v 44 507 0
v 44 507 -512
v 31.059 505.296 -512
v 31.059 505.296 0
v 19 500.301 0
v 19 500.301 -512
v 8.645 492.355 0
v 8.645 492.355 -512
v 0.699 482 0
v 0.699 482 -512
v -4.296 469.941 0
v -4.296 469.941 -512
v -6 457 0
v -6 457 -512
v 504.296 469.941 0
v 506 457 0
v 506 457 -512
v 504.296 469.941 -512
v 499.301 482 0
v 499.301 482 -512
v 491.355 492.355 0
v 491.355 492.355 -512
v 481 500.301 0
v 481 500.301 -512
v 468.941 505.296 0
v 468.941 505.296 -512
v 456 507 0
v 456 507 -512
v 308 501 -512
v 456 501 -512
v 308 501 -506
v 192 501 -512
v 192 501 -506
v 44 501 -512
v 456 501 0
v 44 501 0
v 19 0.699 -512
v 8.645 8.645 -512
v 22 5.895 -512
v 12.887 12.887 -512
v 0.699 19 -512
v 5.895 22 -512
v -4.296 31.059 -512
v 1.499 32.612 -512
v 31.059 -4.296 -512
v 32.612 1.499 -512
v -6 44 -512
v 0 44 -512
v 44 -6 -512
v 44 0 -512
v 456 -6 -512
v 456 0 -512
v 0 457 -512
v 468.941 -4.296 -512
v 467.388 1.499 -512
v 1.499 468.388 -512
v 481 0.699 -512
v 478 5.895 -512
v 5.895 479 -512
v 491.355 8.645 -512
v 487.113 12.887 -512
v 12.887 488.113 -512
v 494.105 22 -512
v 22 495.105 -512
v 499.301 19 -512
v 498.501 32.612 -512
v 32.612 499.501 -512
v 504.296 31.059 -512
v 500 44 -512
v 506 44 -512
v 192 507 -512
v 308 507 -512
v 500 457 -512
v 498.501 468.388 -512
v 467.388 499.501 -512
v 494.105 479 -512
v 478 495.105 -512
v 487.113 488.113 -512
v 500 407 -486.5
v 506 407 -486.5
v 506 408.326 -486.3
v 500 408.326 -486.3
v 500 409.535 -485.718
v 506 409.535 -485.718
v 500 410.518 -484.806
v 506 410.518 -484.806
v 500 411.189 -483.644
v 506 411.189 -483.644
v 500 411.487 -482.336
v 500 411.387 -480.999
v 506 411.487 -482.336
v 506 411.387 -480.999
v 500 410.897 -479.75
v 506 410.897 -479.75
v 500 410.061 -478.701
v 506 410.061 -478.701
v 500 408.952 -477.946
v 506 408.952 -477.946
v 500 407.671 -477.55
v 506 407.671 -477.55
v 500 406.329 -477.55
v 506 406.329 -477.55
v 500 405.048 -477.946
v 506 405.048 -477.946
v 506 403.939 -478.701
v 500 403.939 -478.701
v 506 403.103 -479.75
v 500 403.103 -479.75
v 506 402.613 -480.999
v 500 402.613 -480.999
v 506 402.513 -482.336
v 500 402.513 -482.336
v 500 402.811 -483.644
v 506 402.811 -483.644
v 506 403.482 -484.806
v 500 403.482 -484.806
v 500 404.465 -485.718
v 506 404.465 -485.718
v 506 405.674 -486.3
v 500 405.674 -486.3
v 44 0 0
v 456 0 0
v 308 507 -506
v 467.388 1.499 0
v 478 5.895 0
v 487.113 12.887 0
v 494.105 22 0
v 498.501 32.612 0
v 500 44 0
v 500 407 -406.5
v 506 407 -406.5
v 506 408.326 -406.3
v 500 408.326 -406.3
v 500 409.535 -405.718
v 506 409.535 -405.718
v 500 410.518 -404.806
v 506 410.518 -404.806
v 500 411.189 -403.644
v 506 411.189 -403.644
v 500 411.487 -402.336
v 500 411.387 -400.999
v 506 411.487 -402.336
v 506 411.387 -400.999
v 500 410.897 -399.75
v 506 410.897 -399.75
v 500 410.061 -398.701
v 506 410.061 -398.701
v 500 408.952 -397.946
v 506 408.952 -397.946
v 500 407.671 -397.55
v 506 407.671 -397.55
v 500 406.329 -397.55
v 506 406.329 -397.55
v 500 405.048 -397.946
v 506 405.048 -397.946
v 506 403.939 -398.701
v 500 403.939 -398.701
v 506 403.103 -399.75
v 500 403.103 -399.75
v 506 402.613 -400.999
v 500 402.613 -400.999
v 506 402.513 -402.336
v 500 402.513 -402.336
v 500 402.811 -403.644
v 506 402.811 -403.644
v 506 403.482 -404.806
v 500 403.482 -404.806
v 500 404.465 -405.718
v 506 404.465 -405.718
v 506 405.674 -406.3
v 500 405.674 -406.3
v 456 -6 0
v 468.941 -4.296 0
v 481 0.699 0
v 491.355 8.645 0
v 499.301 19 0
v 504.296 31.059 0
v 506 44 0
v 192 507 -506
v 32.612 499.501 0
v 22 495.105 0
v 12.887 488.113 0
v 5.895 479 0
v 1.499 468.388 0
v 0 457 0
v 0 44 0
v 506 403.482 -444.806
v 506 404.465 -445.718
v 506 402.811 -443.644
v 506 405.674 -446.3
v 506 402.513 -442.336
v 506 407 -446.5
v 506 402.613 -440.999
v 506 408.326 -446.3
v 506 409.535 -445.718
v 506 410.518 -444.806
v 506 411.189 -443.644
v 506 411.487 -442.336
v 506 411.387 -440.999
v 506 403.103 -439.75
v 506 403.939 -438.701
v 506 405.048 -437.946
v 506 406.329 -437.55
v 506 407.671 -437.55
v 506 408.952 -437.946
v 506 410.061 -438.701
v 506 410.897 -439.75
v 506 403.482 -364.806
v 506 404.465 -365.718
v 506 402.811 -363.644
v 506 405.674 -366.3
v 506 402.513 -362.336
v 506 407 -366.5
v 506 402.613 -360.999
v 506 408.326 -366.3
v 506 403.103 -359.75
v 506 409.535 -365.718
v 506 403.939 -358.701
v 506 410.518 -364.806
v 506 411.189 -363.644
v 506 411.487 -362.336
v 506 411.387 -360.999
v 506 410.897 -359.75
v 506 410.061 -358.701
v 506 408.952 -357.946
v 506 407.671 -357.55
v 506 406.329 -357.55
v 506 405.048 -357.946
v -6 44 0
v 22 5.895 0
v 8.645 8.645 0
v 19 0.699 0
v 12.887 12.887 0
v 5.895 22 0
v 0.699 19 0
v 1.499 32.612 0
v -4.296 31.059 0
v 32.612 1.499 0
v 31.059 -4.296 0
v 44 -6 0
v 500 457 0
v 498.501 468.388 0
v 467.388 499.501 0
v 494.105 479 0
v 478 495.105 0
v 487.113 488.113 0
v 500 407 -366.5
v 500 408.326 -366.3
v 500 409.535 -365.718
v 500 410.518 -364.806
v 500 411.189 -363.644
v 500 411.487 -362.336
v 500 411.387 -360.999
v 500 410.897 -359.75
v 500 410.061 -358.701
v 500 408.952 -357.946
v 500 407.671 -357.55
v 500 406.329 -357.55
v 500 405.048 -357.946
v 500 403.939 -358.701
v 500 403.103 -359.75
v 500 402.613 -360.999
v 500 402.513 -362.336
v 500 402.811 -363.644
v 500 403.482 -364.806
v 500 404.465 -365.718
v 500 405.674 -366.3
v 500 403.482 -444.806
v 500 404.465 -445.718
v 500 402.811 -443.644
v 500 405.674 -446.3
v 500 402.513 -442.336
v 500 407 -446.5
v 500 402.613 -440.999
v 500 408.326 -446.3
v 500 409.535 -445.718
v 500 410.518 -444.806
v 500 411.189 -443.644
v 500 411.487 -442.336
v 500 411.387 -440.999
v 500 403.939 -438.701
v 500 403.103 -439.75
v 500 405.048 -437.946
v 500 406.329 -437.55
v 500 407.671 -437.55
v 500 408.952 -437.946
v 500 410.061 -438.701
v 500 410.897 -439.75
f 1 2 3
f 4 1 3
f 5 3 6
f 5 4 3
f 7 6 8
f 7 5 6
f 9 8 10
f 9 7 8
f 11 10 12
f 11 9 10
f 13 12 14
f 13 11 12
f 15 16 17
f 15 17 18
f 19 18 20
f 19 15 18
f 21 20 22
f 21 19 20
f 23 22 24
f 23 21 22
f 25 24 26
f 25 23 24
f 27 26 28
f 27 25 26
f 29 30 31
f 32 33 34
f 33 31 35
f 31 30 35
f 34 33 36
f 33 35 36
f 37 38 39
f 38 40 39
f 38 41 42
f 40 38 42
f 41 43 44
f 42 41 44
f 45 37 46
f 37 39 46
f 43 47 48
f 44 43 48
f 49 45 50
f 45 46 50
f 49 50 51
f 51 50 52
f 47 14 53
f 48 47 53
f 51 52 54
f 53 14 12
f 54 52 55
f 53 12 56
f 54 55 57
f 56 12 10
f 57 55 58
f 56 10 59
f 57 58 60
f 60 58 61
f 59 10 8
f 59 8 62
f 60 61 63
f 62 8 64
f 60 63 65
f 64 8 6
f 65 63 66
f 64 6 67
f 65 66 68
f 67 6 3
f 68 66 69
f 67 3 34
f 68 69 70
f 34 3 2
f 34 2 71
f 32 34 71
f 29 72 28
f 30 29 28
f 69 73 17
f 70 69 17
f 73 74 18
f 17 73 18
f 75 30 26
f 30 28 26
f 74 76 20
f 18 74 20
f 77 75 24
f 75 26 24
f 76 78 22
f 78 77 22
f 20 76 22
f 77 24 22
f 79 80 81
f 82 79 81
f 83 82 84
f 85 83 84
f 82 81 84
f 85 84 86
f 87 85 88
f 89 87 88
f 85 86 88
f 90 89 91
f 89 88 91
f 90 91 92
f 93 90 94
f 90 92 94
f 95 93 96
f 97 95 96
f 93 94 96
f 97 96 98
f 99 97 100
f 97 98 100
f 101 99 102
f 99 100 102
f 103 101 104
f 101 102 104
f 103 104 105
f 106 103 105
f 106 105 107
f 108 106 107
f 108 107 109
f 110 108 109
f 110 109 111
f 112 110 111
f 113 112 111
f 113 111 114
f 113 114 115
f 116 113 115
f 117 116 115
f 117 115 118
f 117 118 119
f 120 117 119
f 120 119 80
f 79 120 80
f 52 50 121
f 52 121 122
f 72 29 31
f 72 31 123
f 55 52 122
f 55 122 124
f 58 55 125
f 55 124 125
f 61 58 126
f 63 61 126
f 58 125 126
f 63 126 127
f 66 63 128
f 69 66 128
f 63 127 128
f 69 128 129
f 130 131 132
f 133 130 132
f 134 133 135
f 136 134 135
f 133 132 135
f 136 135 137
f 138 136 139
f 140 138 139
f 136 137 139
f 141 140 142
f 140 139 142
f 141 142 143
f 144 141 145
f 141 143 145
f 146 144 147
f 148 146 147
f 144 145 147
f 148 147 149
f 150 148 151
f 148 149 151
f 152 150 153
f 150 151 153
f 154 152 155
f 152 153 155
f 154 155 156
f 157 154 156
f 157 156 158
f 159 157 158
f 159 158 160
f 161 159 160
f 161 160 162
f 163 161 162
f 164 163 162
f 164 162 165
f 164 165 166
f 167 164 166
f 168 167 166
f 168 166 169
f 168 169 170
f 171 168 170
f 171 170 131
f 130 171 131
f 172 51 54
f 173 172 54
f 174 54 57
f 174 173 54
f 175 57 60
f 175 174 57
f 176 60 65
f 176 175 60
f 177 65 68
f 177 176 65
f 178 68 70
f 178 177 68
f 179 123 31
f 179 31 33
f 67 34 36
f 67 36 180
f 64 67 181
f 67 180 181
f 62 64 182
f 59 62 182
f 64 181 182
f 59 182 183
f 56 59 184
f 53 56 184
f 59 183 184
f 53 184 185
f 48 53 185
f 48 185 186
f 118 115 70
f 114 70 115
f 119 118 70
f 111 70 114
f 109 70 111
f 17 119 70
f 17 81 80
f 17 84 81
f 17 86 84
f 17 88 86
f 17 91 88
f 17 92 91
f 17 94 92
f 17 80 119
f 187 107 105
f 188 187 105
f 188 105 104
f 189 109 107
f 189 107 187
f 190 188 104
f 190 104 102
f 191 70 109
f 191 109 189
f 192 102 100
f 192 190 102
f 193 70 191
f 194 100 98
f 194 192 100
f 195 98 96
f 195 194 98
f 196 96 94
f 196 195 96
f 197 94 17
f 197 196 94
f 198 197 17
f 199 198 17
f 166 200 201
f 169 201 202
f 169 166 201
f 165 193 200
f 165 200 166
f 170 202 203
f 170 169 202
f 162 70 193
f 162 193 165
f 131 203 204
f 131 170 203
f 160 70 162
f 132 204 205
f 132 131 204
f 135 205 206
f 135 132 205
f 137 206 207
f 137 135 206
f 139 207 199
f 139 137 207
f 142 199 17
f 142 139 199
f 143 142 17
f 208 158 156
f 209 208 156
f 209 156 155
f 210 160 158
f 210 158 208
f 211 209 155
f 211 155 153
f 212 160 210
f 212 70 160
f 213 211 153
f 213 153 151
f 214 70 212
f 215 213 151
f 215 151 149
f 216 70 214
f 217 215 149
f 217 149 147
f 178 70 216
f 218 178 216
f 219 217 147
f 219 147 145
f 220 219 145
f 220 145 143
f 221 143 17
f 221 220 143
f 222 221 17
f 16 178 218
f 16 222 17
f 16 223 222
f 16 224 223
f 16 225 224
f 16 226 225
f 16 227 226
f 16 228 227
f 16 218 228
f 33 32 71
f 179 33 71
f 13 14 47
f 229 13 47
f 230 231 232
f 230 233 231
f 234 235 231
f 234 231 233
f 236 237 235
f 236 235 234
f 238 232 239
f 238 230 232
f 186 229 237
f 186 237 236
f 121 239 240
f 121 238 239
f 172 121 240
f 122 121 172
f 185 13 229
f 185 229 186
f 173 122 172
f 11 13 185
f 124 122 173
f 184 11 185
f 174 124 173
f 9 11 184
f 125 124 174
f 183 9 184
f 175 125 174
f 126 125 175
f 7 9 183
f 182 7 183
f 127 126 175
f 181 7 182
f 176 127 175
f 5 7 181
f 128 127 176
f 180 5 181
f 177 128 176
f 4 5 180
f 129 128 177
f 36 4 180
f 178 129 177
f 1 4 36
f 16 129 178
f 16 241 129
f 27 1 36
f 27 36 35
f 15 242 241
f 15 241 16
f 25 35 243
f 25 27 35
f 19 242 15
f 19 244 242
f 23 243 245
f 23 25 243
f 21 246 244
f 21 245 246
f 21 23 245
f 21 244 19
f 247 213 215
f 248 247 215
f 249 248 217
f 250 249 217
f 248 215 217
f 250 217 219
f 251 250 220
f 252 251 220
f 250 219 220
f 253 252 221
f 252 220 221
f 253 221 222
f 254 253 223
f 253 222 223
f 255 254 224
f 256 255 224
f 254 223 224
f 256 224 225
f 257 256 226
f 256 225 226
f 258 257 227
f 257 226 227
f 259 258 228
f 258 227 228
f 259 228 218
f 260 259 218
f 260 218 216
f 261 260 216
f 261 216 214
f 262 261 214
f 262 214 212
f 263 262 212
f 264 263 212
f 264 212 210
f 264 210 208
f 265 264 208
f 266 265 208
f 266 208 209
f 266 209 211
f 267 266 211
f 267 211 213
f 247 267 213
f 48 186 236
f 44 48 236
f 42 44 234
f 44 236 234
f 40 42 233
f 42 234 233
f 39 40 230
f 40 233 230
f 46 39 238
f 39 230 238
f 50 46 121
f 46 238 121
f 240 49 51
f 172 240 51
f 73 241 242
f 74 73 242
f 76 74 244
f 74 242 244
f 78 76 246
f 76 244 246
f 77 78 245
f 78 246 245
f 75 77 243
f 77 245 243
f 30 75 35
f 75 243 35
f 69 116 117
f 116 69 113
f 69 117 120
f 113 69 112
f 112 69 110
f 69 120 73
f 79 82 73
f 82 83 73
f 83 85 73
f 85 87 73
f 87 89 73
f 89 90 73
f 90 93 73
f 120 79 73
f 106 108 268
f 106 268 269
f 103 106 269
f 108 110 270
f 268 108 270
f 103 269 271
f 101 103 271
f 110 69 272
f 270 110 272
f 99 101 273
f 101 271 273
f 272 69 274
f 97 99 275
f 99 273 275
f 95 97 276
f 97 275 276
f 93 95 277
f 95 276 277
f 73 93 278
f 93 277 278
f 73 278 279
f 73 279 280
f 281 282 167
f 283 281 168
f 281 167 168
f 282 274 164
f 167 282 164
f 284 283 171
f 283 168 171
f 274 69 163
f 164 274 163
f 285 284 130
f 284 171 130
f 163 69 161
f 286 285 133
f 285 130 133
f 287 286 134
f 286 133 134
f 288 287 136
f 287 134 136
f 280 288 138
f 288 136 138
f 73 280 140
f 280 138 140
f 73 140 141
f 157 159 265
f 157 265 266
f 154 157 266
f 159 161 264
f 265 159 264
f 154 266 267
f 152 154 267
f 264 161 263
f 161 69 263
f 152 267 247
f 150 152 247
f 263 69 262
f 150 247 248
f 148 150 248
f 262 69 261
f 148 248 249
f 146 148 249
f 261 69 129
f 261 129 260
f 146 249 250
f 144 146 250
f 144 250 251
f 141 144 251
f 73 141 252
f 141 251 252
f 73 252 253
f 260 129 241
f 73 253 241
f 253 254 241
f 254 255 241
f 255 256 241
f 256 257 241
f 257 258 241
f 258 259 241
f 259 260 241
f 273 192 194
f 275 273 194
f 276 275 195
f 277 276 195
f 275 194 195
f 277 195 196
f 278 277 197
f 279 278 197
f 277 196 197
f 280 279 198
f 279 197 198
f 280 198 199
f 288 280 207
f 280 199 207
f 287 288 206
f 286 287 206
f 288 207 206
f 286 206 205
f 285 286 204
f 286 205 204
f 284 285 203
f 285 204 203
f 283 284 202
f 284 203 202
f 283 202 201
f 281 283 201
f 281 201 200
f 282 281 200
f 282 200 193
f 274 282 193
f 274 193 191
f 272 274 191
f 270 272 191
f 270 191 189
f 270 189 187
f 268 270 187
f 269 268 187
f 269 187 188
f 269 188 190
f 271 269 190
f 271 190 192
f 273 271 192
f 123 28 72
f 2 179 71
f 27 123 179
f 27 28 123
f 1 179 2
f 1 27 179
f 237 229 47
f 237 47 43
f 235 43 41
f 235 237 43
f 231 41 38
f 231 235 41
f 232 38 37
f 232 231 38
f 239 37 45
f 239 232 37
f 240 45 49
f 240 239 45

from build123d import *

# Parameters (mm, degrees)
EXTRUDE_THIN1_DEPTH = 512
SKETCH3_R           = 4.5
CUT_EXTRUDE1_DEPTH  = 10
LPATTERN1_COUNT     = 4
LPATTERN1_PITCH     = 40
SKETCH4_W           = 116
SKETCH4_H           = 6
CUT_EXTRUDE2_DEPTH  = 6


with BuildPart() as part:
    # Sketch1 → Extrude-Thin1 (new body)
    with BuildSketch(Plane.XY):
        with BuildLine():
            Line((44, -6), (456, -6))
            ThreePointArc((456, -6), (491.355339059, 8.644660941), (506, 44))
            Line((506, 44), (506, 457))
            ThreePointArc((506, 457), (491.355339059, 492.355339059), (456, 507))
            Line((456, 507), (44, 507))
            ThreePointArc((44, 507), (8.644660941, 492.355339059), (-6, 457))
            Line((-6, 457), (-6, 44))
            ThreePointArc((-6, 44), (8.644660941, 8.644660941), (44, -6))
        make_face()
        with BuildLine():
            Line((44, 0), (456, 0))
            ThreePointArc((456, 0), (487.112698372, 12.887301628), (500, 44))
            Line((500, 44), (500, 457))
            ThreePointArc((500, 457), (487.112698372, 488.112698372), (456, 501))
            Line((456, 501), (44, 501))
            ThreePointArc((44, 501), (12.887301628, 488.112698372), (0, 457))
            Line((0, 457), (0, 44))
            ThreePointArc((0, 44), (12.887301628, 12.887301628), (44, 0))
        make_face(mode=Mode.SUBTRACT)
    extrude(amount=-EXTRUDE_THIN1_DEPTH)

    # Sketch3 → Cut-Extrude1 (cut)
    with BuildSketch(Plane(origin=(506, 0, 0), x_dir=(0, 0, -1), z_dir=(1, 0, 0))):
        with Locations((482, 407)):
            Circle(SKETCH3_R)
    cut_extrude1 = extrude(amount=-CUT_EXTRUDE1_DEPTH, mode=Mode.SUBTRACT)

    # LPattern1: Cut-Extrude1 ×4
    with Locations(*[(0, 0, i * LPATTERN1_PITCH) for i in range(1, LPATTERN1_COUNT)]):
        add(cut_extrude1, mode=Mode.SUBTRACT)

    # Sketch4 → Cut-Extrude2 (cut)
    with BuildSketch(Plane(origin=(0, 0, -512), x_dir=(-1, 0, 0), z_dir=(0, 0, -1))):
        with Locations((-250, 504)):
            Rectangle(SKETCH4_W, SKETCH4_H)
    extrude(amount=-CUT_EXTRUDE2_DEPTH, mode=Mode.SUBTRACT)


solid = part.part
